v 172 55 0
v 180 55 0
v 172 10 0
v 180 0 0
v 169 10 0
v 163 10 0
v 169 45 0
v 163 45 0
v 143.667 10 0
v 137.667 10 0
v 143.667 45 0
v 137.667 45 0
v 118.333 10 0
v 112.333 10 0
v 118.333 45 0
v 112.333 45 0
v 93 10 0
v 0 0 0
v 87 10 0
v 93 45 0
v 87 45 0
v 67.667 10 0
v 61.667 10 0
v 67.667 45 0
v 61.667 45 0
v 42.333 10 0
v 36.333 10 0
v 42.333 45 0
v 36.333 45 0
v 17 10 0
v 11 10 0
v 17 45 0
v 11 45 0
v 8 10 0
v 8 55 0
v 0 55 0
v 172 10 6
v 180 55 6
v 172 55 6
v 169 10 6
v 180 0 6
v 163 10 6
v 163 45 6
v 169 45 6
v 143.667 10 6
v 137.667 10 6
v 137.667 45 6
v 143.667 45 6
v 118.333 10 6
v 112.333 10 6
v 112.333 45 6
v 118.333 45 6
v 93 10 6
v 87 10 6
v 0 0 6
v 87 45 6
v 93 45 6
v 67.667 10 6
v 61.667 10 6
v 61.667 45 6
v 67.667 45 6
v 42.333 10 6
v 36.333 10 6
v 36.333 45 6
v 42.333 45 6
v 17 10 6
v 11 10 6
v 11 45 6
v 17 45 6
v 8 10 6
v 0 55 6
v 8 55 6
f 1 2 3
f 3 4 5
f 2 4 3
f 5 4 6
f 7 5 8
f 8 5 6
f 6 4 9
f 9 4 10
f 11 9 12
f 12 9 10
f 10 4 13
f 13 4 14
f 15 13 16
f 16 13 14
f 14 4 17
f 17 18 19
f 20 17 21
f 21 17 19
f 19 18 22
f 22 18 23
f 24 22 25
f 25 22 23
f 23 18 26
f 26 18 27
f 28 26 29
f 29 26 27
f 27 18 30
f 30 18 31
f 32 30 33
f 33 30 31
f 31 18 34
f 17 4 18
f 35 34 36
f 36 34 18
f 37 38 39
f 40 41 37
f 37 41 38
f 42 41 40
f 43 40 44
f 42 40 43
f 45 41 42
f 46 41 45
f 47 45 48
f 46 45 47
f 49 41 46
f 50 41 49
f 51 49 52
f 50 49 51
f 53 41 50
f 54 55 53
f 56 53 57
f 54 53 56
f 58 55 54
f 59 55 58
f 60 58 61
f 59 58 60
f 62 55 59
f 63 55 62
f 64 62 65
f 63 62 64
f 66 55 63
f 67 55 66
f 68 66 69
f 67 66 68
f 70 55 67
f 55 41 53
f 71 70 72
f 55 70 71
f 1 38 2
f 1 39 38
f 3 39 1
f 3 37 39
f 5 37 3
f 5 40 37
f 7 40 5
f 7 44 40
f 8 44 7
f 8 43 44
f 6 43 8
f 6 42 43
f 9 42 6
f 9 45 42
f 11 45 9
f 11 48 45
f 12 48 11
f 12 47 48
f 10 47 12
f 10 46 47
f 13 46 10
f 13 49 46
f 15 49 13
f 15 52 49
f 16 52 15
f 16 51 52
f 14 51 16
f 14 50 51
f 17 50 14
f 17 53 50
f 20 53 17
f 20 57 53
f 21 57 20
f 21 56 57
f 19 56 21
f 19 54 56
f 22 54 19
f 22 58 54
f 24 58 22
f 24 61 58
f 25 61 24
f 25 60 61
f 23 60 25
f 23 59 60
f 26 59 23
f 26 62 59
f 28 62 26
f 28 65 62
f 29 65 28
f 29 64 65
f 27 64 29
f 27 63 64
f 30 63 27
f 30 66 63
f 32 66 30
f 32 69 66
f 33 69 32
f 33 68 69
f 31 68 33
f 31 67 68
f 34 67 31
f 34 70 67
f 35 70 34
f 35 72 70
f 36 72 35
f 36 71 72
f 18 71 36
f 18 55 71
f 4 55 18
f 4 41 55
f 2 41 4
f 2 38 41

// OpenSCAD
$fn = 32;

// ----------------------------------------------------------------------
// Guard grille: 7 slats over a 180 x 55 mm plate
// ----------------------------------------------------------------------

// --- parameters (mm) ---
profile_height = 6;       // extrusion height
profile_points = 36;      // points of the closed outline

profile = [[0, 0], [180, 0], [180, 55], [172, 55], [172, 10], [169, 10], [169, 45], [163, 45], [163, 10], [143.667, 10], [143.667, 45], [137.667, 45], [137.667, 10], [118.333, 10], [118.333, 45], [112.333, 45], [112.333, 10], [93, 10], [93, 45], [87, 45], [87, 10], [67.667, 10], [67.667, 45], [61.667, 45], [61.667, 10], [42.333, 10], [42.333, 45], [36.333, 45], [36.333, 10], [17, 10], [17, 45], [11, 45], [11, 10], [8, 10], [8, 55], [0, 55]];  // single closed polygon, 36 points, counter clockwise

// --- the one profile operation ---
linear_extrude(height = profile_height) polygon(points = profile);
